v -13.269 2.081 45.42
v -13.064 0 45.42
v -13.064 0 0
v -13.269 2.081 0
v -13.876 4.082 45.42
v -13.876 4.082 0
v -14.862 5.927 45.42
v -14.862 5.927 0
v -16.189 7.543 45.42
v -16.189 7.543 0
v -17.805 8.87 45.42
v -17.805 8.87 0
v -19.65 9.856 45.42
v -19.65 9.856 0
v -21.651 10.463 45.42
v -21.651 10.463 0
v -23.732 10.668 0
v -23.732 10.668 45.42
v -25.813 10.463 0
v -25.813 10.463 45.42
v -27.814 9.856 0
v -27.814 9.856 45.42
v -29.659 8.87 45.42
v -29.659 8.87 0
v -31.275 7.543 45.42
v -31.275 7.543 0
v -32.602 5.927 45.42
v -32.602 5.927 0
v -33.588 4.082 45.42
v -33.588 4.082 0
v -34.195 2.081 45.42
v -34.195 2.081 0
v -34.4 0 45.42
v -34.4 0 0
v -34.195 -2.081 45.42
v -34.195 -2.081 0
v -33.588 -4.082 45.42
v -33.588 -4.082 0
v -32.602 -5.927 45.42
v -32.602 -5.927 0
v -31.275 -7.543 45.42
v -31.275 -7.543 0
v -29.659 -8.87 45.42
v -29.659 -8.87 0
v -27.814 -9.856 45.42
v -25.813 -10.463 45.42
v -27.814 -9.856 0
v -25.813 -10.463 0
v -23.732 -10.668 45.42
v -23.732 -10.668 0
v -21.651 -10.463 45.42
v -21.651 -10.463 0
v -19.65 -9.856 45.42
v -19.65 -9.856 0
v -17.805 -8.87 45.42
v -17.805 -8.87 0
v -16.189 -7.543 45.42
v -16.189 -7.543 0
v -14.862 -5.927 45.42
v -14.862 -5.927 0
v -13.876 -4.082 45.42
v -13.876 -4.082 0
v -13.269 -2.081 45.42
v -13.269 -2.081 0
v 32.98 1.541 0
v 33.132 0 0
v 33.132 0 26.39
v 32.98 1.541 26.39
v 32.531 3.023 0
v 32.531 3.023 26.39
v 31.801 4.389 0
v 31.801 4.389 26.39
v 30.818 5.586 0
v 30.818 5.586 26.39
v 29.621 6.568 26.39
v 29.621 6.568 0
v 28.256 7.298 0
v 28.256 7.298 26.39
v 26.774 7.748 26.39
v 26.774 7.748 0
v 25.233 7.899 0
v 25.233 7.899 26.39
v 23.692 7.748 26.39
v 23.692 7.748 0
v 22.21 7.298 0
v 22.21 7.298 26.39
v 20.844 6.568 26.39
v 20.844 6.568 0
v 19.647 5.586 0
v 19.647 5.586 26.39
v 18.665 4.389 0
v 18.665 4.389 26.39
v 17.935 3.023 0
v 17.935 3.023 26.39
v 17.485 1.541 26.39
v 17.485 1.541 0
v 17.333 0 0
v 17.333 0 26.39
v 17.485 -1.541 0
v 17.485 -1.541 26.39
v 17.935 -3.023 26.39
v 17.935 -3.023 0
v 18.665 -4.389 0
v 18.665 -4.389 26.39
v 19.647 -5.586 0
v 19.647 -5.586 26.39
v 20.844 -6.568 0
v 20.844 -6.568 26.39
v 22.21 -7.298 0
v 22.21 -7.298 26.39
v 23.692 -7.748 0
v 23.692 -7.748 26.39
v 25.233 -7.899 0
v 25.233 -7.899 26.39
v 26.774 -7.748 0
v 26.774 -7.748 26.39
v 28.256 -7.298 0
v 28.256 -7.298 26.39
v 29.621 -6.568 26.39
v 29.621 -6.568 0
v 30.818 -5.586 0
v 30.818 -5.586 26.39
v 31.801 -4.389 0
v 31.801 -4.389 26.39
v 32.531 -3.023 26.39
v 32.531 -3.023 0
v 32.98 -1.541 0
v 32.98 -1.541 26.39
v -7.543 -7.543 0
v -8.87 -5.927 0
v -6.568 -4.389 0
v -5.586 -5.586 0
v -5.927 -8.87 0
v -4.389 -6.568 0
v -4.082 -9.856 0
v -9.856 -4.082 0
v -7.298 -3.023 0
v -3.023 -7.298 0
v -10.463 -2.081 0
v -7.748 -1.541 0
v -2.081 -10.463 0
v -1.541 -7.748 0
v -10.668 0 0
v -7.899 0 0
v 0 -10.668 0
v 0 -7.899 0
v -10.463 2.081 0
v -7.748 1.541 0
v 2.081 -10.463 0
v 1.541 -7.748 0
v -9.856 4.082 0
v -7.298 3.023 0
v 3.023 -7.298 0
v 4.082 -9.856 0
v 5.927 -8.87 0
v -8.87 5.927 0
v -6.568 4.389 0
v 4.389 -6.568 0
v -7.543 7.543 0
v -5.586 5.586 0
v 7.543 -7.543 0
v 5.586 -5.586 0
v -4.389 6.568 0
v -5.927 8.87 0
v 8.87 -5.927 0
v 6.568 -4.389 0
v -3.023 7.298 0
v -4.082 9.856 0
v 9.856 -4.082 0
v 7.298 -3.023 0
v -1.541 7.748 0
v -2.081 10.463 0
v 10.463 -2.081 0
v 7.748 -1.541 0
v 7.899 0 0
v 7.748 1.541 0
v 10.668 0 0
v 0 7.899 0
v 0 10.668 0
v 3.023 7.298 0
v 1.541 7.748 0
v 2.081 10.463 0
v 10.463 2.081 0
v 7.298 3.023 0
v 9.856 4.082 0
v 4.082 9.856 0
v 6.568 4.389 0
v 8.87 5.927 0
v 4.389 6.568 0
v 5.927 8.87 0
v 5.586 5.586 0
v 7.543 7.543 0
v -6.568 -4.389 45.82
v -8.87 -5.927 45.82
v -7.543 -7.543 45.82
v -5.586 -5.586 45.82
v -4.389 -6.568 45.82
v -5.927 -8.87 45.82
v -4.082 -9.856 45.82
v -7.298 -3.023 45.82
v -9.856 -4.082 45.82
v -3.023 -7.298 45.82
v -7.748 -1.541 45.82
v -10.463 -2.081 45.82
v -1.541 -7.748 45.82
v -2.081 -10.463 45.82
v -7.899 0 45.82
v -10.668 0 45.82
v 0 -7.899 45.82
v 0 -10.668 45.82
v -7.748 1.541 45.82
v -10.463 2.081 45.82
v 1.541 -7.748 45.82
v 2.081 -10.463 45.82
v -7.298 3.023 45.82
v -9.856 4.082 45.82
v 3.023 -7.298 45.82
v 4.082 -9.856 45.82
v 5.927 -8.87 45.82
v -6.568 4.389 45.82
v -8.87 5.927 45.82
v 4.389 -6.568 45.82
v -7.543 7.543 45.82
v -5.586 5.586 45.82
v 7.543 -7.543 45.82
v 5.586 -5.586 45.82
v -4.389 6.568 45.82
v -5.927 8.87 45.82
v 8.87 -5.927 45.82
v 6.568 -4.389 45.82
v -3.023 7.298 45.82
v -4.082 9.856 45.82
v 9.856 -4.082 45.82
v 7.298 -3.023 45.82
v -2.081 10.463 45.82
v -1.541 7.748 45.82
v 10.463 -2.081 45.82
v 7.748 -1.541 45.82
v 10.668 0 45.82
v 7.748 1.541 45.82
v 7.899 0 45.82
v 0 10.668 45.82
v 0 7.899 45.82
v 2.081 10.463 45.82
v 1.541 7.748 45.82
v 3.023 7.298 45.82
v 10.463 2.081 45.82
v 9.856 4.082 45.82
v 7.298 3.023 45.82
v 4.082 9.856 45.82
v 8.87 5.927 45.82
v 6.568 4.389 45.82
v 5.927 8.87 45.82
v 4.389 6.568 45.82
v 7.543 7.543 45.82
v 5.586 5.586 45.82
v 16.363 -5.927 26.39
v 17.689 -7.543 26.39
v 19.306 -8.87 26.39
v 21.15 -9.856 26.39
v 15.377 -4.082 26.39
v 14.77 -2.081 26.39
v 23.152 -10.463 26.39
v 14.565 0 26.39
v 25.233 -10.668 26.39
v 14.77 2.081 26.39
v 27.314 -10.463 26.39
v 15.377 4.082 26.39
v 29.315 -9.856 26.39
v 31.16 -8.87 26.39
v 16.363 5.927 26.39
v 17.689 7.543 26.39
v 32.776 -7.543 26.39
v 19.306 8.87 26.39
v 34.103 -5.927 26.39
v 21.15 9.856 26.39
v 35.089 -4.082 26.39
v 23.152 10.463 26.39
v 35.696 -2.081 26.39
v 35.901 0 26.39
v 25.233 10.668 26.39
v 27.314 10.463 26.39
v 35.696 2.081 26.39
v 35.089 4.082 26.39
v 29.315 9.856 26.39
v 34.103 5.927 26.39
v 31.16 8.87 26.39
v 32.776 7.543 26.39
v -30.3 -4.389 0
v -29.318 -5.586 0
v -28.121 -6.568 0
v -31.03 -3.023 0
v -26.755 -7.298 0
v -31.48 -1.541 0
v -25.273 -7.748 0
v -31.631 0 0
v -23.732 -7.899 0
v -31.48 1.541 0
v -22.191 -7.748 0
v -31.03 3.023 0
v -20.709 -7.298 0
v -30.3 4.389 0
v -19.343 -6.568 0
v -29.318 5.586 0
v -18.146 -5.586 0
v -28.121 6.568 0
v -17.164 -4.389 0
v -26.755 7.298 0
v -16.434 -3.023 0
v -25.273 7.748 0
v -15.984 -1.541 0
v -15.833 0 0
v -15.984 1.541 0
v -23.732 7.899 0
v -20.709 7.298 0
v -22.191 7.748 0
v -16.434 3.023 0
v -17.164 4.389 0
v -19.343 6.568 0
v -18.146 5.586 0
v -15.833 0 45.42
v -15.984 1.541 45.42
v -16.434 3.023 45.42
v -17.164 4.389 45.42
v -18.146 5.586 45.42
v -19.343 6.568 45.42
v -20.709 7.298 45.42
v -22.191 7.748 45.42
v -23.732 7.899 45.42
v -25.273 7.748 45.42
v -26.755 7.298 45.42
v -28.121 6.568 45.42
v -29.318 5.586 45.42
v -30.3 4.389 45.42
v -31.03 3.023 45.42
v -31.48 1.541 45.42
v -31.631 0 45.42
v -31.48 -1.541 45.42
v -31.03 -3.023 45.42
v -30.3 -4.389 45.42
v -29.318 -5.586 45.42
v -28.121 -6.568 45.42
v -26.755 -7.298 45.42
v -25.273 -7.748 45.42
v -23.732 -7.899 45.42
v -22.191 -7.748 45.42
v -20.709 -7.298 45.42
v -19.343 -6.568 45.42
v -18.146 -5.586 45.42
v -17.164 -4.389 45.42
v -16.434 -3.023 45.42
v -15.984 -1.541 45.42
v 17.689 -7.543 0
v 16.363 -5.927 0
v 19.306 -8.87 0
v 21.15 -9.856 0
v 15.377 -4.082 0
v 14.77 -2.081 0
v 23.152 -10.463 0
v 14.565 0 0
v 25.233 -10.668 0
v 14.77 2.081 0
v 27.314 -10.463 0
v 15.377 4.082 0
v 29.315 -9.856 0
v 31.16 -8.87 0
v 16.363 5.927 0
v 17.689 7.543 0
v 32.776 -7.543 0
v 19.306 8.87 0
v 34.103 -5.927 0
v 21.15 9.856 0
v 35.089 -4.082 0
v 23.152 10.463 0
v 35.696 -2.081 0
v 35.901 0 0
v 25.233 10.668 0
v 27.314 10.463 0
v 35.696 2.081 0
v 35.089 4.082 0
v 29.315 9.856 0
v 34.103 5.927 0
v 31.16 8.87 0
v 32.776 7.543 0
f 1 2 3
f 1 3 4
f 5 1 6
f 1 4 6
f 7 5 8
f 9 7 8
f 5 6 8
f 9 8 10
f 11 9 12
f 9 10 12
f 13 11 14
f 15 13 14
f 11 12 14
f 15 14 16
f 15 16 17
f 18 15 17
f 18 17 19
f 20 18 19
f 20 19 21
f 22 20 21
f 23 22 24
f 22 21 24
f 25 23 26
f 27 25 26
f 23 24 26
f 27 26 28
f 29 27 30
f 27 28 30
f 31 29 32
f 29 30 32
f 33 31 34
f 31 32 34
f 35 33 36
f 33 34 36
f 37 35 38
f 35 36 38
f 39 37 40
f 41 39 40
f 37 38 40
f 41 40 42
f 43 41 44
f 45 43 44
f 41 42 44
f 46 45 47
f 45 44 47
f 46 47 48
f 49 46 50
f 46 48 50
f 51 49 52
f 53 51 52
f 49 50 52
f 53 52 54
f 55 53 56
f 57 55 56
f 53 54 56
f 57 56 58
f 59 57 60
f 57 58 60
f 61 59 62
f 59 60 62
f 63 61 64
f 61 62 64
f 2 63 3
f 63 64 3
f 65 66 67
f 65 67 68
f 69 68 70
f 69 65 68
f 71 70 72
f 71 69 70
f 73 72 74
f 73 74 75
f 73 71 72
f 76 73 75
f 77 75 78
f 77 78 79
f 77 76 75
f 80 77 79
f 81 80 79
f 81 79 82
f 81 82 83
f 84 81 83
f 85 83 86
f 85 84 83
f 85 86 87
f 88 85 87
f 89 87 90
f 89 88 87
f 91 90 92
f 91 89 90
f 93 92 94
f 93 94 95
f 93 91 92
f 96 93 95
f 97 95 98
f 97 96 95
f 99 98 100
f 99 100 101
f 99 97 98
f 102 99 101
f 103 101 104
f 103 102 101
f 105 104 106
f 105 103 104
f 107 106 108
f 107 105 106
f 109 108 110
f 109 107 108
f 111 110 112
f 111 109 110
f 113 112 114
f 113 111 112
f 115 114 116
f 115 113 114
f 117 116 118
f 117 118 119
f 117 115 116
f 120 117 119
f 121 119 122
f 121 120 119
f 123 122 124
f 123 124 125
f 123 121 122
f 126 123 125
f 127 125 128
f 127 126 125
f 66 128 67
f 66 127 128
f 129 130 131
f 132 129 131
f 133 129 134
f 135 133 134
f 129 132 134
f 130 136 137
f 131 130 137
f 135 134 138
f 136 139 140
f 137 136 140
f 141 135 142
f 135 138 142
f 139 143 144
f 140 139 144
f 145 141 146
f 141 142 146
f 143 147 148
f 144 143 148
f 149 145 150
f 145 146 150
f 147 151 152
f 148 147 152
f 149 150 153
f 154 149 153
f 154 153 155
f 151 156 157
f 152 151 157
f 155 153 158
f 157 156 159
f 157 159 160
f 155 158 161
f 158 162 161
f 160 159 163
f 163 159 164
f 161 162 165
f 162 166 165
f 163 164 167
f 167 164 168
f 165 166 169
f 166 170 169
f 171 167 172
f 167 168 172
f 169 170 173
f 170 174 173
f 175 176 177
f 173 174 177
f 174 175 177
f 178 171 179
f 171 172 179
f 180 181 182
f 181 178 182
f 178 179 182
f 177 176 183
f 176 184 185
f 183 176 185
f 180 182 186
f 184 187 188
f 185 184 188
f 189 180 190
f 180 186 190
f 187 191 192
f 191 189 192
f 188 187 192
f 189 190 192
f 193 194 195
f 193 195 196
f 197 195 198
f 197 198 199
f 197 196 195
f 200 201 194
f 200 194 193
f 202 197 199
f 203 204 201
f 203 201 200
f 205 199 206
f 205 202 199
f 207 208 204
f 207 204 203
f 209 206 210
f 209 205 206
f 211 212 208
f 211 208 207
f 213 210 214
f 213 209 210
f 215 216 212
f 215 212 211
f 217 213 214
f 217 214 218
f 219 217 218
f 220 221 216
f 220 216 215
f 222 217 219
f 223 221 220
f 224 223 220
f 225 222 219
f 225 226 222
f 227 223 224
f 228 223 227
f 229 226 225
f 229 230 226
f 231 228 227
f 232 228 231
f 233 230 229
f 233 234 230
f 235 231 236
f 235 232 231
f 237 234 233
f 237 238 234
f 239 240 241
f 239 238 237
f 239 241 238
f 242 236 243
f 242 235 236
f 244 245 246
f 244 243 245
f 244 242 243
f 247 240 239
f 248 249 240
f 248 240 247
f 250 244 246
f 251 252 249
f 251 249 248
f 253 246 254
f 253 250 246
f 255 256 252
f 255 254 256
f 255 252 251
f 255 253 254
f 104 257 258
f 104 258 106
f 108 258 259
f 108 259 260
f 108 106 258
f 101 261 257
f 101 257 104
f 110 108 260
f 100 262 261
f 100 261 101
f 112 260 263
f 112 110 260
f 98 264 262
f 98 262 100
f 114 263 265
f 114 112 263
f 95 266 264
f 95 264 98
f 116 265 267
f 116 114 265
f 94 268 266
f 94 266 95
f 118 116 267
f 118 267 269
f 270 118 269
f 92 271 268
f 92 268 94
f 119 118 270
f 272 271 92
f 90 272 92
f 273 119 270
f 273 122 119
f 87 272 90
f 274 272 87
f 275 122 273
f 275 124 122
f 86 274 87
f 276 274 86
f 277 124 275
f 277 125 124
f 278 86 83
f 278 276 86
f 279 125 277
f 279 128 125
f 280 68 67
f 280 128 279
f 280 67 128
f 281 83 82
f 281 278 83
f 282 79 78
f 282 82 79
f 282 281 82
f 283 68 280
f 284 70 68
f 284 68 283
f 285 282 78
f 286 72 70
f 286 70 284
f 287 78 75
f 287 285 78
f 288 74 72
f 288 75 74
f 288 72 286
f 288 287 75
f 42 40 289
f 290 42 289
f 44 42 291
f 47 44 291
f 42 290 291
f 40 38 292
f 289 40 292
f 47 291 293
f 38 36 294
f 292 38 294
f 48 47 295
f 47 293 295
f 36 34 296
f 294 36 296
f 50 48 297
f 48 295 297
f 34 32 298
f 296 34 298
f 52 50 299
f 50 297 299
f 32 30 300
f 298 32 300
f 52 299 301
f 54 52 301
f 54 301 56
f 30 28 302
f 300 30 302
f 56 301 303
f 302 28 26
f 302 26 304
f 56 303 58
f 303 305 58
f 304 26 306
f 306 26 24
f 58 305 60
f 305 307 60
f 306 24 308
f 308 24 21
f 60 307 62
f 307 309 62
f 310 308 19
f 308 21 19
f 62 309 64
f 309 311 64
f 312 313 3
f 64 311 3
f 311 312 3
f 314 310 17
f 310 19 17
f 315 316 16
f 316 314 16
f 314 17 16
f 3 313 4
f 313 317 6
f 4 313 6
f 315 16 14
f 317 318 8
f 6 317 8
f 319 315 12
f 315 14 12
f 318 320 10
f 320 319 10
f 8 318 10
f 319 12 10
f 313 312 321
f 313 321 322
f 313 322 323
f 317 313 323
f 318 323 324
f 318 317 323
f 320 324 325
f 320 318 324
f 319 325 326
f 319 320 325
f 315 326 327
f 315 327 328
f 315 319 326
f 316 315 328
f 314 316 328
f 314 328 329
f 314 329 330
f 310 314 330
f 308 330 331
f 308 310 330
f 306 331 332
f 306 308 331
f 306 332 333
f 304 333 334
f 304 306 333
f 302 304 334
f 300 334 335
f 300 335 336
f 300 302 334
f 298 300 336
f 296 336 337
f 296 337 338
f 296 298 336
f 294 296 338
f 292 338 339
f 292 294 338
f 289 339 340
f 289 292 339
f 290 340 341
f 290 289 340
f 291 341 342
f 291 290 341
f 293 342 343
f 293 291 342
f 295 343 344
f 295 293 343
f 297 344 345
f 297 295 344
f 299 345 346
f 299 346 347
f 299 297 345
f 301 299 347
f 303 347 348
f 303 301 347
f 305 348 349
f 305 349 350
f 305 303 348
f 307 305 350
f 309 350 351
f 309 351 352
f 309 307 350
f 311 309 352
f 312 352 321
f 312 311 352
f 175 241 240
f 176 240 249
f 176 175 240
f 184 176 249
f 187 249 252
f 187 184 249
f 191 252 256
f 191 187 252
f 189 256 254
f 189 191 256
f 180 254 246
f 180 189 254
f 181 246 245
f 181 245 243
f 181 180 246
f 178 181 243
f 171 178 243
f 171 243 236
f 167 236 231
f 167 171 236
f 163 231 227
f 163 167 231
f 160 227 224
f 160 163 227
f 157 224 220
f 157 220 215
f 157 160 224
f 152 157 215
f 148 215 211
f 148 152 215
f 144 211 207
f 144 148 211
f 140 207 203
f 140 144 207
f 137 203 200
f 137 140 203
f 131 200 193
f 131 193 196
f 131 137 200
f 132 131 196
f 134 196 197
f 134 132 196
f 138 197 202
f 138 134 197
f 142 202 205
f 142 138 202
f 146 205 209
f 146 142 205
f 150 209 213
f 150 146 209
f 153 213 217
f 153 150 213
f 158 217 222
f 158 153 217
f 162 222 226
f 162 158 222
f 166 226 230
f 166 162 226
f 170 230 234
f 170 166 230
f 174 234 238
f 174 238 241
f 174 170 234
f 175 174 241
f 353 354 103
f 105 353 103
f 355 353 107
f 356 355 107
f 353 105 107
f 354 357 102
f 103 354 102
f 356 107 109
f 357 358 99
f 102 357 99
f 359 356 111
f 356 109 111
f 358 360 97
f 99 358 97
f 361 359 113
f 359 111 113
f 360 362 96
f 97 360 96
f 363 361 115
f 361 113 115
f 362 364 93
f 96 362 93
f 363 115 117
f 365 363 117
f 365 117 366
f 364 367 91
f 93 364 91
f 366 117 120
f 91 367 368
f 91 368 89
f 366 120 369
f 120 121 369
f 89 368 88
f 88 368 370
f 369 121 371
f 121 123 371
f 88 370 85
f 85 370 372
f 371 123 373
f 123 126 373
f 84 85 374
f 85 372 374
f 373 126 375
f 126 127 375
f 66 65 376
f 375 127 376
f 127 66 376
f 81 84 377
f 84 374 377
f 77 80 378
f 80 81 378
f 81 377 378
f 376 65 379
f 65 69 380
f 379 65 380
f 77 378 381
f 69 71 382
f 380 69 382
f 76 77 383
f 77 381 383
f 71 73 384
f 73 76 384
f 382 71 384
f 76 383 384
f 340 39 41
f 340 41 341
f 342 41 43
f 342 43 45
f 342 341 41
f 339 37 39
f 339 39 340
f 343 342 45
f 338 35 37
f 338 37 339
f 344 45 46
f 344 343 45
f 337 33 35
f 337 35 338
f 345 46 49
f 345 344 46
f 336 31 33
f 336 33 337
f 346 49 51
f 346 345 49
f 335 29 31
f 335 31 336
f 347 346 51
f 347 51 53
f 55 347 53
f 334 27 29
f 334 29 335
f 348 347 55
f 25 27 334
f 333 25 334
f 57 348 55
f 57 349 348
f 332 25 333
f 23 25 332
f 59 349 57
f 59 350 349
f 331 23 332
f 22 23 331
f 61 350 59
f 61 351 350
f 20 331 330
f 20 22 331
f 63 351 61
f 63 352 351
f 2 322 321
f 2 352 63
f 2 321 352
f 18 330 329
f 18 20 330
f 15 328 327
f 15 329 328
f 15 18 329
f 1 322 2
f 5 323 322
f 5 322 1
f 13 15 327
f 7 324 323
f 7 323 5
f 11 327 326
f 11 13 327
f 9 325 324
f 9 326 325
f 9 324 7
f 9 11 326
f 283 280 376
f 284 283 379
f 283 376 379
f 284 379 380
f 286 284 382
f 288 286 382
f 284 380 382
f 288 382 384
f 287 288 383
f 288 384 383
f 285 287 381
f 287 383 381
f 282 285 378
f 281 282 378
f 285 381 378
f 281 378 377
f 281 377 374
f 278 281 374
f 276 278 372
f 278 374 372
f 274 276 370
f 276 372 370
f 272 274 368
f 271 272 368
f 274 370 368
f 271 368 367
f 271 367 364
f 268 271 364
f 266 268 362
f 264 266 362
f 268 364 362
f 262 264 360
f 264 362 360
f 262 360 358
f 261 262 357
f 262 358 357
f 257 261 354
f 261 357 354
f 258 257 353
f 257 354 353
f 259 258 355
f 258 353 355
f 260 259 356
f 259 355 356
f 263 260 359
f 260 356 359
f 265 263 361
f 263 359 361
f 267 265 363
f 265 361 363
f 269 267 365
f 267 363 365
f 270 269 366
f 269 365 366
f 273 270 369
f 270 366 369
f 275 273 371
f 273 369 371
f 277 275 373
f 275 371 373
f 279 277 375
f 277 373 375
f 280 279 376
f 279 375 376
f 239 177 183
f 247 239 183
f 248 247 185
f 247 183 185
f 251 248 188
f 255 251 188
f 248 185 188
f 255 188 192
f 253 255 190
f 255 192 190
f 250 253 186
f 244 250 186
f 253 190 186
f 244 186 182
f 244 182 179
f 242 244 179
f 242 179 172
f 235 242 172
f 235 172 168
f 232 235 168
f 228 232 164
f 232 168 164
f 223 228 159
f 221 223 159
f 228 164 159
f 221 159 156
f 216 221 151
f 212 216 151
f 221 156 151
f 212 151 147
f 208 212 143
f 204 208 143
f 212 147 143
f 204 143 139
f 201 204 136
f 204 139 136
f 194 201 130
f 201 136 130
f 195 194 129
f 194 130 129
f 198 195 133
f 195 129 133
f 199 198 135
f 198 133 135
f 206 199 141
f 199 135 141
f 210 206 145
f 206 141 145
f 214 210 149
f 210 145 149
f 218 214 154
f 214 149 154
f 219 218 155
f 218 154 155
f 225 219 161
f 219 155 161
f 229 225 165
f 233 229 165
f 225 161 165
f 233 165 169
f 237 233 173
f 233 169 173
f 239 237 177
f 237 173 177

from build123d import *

# Parameters (mm, degrees)
F0_R     = 10.668
F0_R_2   = 7.8994
F1_DEPTH = 45.82
F2_R     = 10.668
F2_R_2   = 7.8994
F3_DEPTH = 45.42
F4_R     = 10.668
F4_R_2   = 7.8994
F5_DEPTH = 26.39


with BuildPart() as f1:
    # F0 (on Top) → F1 (new body)
    with BuildSketch(Plane.XY):
        Circle(F0_R)
        Circle(F0_R_2, mode=Mode.SUBTRACT)
    extrude(amount=F1_DEPTH)


with BuildPart() as f3:
    # F2 (on Top) → F3 (new body)
    with BuildSketch(Plane.XY):
        with Locations((-23.731971, 0)):
            Circle(F2_R)
        with Locations((-23.731971, 0)):
            Circle(F2_R_2, mode=Mode.SUBTRACT)
    extrude(amount=F3_DEPTH)


with BuildPart() as f5:
    # F4 (on Top) → F5 (new body)
    with BuildSketch(Plane.XY):
        with Locations((25.232755, 0)):
            Circle(F4_R)
        with Locations((25.232755, 0)):
            Circle(F4_R_2, mode=Mode.SUBTRACT)
    extrude(amount=F5_DEPTH)


solid = Compound([f1.part, f3.part, f5.part])
